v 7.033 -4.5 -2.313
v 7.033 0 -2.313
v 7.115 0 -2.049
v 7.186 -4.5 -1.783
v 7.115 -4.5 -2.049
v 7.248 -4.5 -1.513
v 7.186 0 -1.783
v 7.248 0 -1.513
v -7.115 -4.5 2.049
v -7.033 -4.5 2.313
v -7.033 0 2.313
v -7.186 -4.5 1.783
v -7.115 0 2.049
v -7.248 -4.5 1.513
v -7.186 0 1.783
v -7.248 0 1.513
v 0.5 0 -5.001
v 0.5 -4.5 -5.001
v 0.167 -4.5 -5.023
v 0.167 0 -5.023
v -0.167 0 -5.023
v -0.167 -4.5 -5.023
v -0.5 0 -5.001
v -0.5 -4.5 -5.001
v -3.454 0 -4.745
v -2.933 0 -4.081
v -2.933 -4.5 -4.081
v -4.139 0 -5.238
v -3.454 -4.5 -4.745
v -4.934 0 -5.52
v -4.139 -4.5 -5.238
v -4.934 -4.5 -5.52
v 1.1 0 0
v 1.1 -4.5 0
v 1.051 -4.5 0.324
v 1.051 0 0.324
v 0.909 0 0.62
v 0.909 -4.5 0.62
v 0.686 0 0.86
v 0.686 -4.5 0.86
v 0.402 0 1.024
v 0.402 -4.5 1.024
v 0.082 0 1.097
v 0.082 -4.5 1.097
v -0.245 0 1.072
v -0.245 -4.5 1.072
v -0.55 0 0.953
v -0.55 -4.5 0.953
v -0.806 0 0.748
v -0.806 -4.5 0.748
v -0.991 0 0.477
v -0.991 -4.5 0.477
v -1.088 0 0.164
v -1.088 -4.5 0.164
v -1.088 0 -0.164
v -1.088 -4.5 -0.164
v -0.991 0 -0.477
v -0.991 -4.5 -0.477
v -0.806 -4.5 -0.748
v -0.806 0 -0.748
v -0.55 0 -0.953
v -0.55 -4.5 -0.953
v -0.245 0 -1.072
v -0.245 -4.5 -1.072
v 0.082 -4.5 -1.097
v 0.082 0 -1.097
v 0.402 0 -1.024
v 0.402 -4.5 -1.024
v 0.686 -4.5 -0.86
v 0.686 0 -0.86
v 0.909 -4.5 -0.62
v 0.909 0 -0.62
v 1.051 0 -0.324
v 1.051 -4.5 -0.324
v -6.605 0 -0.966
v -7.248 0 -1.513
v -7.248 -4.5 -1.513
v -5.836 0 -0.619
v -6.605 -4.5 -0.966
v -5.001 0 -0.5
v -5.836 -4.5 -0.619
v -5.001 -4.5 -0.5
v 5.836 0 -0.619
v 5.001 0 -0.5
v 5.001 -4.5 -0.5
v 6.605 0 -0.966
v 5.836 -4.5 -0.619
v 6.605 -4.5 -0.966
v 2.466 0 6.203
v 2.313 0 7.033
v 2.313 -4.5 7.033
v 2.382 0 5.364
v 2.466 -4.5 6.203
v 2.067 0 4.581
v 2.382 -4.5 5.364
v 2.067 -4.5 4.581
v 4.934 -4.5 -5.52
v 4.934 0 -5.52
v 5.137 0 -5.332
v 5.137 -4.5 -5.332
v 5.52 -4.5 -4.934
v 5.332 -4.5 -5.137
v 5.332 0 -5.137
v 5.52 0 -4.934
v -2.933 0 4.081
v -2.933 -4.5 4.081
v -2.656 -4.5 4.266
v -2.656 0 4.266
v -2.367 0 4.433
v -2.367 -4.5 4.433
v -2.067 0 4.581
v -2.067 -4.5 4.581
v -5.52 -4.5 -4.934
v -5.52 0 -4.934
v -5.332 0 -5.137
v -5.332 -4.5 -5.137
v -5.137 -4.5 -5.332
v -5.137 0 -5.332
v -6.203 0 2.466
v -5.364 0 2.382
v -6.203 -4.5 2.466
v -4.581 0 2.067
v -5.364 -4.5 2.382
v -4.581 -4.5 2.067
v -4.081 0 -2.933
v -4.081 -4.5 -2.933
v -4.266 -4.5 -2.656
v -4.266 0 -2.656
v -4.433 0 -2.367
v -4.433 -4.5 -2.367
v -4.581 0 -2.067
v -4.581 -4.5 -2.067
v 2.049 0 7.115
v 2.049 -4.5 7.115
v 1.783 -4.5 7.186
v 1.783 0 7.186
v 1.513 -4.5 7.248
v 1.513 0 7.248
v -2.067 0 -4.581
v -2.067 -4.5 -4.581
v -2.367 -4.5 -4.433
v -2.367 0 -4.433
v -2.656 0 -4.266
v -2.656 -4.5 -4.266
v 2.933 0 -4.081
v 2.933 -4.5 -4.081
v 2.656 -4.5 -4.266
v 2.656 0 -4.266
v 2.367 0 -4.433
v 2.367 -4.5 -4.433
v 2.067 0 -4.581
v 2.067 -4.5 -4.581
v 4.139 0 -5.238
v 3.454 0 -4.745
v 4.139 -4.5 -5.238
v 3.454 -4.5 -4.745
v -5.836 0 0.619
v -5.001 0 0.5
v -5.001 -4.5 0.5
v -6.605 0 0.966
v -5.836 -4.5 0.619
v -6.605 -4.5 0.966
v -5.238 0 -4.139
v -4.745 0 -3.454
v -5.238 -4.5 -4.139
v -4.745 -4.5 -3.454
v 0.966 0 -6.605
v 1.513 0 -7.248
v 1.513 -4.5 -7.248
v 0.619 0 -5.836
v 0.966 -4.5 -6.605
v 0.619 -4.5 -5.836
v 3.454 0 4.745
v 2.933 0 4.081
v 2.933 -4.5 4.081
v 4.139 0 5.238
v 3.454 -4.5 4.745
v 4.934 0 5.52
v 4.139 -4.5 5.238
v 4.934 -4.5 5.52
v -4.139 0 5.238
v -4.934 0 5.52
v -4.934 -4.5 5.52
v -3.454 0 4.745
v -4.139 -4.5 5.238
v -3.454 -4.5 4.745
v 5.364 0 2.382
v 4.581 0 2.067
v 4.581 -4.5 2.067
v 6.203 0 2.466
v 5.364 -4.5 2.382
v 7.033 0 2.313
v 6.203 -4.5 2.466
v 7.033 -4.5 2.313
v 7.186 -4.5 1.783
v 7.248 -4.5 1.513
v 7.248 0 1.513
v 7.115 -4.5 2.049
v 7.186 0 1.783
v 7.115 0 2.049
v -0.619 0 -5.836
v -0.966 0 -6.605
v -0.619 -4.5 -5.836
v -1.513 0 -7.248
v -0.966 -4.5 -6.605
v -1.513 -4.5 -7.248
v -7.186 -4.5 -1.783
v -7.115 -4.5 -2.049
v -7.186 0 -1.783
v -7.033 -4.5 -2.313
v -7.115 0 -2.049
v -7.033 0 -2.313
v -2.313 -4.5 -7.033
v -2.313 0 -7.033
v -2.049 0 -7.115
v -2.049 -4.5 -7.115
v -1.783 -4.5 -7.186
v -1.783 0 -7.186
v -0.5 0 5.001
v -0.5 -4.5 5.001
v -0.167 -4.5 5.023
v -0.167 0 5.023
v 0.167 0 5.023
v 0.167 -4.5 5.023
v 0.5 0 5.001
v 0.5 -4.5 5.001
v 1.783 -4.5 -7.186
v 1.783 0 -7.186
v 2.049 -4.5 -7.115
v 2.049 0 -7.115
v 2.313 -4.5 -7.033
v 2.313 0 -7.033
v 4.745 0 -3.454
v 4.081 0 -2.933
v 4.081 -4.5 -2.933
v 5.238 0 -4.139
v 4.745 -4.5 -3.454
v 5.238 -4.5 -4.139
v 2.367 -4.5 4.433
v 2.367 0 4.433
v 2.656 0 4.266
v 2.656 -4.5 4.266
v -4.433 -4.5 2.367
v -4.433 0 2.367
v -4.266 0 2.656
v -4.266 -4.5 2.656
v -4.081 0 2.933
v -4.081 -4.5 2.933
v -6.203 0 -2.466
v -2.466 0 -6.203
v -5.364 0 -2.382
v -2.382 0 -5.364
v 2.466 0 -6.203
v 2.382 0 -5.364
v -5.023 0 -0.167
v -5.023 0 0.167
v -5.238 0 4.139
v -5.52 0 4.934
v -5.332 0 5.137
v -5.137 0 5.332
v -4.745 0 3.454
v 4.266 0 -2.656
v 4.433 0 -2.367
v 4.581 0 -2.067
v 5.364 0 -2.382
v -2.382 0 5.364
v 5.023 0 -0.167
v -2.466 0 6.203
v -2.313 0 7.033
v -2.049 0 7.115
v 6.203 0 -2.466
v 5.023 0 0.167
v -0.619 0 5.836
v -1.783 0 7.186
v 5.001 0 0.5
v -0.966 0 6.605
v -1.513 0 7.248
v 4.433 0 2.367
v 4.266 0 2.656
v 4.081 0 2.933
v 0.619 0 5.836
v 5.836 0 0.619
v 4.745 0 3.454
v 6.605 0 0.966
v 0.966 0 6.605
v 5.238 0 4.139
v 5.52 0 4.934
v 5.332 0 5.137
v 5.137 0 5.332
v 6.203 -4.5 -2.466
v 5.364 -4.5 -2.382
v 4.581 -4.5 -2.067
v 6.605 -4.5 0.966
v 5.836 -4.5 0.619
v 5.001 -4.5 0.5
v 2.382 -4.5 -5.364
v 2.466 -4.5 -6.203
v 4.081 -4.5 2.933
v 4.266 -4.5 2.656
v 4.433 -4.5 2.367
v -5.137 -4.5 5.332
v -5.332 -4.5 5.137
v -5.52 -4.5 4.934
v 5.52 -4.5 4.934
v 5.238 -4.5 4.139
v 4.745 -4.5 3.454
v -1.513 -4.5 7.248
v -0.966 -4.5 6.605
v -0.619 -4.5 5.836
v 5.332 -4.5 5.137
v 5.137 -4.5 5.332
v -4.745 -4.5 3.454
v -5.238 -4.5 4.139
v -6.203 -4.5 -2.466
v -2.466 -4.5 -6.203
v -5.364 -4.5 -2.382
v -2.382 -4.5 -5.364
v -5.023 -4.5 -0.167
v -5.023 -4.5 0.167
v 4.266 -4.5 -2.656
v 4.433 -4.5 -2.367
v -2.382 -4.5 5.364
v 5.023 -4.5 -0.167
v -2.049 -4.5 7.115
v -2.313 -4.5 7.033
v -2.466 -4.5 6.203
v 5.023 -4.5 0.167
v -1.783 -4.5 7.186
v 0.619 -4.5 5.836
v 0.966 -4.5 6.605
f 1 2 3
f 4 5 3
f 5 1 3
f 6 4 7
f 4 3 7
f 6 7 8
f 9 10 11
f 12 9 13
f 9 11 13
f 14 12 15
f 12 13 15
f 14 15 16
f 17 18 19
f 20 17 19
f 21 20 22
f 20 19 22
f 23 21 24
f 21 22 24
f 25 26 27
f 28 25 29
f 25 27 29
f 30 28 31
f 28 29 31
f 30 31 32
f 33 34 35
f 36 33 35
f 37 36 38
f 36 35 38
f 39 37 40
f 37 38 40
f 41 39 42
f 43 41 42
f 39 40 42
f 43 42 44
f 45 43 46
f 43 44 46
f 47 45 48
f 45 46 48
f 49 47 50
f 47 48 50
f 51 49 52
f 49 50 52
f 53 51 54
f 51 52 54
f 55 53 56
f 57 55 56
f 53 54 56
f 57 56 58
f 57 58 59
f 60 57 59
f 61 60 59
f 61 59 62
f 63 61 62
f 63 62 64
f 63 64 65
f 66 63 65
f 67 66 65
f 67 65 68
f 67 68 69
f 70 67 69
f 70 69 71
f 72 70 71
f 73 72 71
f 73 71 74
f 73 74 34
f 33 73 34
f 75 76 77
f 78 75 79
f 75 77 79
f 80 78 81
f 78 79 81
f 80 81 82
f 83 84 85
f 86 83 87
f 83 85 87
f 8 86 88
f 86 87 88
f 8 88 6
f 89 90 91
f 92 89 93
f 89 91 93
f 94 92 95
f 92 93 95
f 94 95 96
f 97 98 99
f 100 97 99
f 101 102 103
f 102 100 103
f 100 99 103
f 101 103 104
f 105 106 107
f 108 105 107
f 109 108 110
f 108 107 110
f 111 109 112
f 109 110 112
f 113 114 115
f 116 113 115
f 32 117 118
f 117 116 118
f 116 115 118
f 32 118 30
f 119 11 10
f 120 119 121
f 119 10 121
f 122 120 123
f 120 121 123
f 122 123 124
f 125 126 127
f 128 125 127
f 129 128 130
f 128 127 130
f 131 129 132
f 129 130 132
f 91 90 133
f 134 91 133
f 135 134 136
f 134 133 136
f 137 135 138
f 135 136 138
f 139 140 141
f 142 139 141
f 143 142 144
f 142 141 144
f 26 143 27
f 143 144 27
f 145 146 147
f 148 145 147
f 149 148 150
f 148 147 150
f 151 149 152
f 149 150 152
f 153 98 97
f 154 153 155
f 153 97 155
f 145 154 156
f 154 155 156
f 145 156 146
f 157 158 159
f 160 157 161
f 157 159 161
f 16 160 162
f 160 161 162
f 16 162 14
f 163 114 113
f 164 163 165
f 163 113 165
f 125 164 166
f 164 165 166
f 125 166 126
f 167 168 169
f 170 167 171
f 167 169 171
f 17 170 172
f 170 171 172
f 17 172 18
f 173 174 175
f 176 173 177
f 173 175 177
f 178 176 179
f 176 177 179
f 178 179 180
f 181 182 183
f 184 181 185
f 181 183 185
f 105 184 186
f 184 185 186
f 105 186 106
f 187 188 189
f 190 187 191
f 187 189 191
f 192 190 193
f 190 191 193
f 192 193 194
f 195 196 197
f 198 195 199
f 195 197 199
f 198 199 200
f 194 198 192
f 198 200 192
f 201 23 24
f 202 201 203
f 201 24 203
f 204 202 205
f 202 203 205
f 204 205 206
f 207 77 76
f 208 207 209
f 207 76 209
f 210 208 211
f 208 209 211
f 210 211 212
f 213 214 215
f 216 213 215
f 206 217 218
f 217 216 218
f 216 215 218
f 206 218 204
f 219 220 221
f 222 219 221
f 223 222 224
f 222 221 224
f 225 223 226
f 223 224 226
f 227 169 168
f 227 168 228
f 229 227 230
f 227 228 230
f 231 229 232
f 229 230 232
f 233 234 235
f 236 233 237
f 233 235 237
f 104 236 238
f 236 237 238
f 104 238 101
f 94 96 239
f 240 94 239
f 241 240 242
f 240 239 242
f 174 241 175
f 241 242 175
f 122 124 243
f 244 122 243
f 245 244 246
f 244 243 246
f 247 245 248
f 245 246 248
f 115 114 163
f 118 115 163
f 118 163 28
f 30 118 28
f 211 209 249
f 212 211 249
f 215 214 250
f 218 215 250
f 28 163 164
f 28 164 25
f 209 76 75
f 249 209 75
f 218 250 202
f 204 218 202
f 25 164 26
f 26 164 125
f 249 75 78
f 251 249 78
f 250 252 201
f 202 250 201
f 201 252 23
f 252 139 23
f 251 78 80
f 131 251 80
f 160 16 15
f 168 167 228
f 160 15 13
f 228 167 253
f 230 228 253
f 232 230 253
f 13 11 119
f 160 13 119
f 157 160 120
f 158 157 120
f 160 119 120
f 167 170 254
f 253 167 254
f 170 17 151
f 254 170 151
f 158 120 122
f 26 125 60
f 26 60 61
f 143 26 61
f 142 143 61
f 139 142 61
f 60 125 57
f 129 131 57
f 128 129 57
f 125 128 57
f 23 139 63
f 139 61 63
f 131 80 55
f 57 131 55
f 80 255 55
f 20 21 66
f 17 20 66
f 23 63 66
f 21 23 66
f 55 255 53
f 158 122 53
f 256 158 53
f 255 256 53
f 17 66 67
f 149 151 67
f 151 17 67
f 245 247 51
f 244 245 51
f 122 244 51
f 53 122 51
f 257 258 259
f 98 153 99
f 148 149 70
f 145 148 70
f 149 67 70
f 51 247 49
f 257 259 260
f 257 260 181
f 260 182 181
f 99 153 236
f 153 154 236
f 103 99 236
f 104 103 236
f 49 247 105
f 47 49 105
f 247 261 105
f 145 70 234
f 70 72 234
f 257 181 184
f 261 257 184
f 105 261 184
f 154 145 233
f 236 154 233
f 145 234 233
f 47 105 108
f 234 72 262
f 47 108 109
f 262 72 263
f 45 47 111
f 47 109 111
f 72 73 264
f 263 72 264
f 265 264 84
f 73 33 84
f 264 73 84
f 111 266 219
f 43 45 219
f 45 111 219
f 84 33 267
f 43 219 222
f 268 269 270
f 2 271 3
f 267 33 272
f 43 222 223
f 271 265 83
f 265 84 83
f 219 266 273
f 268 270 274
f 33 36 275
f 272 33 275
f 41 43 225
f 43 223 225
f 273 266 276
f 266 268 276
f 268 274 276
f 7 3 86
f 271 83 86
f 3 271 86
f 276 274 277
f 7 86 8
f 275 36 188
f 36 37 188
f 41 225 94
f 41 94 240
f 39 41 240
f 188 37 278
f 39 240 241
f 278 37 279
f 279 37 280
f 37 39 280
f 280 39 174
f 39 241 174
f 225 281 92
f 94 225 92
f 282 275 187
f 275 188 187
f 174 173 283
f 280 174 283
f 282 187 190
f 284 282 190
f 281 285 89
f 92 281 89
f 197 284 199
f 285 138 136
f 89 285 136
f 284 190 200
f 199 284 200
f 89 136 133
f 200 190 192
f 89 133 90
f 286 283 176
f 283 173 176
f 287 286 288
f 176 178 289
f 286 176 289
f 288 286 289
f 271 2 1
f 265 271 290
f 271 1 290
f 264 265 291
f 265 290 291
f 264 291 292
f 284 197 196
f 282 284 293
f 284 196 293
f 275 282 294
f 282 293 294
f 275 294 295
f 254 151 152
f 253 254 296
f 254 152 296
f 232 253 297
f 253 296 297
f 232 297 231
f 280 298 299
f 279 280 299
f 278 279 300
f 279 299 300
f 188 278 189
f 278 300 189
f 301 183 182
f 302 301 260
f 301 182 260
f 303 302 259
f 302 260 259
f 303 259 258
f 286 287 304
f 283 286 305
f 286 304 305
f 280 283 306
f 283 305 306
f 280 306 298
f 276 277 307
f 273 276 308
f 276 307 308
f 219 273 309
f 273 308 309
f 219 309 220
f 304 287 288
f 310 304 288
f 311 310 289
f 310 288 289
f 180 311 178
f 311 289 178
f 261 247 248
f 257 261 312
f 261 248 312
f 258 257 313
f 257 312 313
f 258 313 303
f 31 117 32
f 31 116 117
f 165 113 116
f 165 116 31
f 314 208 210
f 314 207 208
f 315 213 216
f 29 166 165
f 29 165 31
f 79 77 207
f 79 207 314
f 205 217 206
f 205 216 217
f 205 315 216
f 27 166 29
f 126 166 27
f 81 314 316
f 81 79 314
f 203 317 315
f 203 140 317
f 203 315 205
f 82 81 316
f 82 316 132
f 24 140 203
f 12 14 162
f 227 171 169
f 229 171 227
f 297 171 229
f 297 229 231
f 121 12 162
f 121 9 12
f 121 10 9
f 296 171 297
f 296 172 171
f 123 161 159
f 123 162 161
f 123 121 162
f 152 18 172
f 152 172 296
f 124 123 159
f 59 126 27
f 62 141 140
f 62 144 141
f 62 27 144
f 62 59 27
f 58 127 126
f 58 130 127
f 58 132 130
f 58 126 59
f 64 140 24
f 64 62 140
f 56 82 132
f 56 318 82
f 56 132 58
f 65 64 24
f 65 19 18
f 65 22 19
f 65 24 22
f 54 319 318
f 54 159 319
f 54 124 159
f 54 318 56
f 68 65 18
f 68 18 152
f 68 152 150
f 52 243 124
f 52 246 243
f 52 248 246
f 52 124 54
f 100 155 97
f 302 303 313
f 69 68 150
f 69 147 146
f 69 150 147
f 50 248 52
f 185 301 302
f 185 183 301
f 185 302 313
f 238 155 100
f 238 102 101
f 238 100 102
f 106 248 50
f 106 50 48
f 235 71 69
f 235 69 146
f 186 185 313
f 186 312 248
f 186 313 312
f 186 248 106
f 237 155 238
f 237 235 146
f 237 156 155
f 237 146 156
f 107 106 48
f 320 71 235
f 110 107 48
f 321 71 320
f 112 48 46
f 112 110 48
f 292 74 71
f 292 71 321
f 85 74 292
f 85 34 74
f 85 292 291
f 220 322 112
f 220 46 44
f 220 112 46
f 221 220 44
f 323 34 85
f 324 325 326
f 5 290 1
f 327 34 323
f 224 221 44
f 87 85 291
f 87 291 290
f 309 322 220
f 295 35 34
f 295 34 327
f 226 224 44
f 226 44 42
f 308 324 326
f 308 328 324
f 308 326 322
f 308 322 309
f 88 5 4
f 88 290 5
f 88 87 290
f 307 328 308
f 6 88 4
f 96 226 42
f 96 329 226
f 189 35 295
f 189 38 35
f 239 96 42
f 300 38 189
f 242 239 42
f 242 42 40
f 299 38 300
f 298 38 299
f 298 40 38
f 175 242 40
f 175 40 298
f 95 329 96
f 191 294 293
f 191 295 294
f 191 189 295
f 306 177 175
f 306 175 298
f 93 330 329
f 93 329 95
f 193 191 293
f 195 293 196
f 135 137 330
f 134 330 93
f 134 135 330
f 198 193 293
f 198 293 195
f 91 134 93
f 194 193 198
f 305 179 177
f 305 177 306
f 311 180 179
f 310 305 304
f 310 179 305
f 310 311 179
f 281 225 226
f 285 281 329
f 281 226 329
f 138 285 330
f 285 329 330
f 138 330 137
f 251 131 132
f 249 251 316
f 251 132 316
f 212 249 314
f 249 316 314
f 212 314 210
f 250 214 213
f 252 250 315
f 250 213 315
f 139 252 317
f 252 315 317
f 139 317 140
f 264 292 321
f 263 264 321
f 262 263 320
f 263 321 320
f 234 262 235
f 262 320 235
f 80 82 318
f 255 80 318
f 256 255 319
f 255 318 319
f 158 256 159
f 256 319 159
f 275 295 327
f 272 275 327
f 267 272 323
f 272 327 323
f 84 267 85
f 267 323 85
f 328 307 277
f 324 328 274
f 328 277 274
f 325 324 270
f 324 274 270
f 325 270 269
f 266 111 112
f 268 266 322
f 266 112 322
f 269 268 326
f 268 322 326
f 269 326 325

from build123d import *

# Parameters (mm, degrees)
F0_R     = 7.404
F1_DEPTH = 4.5
F3_DEPTH = 4.501
F4_COUNT = 12
F5_R     = 1.1
F6_DEPTH = 4.501


with BuildPart() as f1:
    # F0 (on Front) → F1 (new body)
    with BuildSketch(Plane.XZ):
        Circle(F0_R)
    extrude(amount=F1_DEPTH)

    # F2 (on face) → F3 (cut, through all)
    with BuildSketch(Plane.XZ.offset(4.5)):
        with BuildLine():
            ThreePointArc((-0.5000000047, 5.0005649926), (0, 5.0255), (0.5000000047, 5.0005649926))
            ThreePointArc((0.5000000047, 5.0005649926), (0.7650993145, 6.2330119666), (1.51312227, 7.2477359911))
            ThreePointArc((1.51312227, 7.2477359911), (0, 7.404), (-1.51312227, 7.2477359911))
            ThreePointArc((-1.51312227, 7.2477359911), (-0.7650993145, 6.2330119666), (-0.5000000047, 5.0005649926))
        make_face()
    f3 = extrude(amount=-F3_DEPTH, mode=Mode.SUBTRACT)

    # F4: F3 ×12 about axis
    f4_axis = Axis((0, 0, 0), (0, 1, 0))
    for i in range(1, F4_COUNT):
        add(f3.rotate(f4_axis, i * 360 / F4_COUNT), mode=Mode.SUBTRACT)

    # F5 (on face) → F6 (cut, through all)
    with BuildSketch(Plane.XZ.offset(4.5)):
        Circle(F5_R)
    extrude(amount=-F6_DEPTH, mode=Mode.SUBTRACT)


solid = f1.part
